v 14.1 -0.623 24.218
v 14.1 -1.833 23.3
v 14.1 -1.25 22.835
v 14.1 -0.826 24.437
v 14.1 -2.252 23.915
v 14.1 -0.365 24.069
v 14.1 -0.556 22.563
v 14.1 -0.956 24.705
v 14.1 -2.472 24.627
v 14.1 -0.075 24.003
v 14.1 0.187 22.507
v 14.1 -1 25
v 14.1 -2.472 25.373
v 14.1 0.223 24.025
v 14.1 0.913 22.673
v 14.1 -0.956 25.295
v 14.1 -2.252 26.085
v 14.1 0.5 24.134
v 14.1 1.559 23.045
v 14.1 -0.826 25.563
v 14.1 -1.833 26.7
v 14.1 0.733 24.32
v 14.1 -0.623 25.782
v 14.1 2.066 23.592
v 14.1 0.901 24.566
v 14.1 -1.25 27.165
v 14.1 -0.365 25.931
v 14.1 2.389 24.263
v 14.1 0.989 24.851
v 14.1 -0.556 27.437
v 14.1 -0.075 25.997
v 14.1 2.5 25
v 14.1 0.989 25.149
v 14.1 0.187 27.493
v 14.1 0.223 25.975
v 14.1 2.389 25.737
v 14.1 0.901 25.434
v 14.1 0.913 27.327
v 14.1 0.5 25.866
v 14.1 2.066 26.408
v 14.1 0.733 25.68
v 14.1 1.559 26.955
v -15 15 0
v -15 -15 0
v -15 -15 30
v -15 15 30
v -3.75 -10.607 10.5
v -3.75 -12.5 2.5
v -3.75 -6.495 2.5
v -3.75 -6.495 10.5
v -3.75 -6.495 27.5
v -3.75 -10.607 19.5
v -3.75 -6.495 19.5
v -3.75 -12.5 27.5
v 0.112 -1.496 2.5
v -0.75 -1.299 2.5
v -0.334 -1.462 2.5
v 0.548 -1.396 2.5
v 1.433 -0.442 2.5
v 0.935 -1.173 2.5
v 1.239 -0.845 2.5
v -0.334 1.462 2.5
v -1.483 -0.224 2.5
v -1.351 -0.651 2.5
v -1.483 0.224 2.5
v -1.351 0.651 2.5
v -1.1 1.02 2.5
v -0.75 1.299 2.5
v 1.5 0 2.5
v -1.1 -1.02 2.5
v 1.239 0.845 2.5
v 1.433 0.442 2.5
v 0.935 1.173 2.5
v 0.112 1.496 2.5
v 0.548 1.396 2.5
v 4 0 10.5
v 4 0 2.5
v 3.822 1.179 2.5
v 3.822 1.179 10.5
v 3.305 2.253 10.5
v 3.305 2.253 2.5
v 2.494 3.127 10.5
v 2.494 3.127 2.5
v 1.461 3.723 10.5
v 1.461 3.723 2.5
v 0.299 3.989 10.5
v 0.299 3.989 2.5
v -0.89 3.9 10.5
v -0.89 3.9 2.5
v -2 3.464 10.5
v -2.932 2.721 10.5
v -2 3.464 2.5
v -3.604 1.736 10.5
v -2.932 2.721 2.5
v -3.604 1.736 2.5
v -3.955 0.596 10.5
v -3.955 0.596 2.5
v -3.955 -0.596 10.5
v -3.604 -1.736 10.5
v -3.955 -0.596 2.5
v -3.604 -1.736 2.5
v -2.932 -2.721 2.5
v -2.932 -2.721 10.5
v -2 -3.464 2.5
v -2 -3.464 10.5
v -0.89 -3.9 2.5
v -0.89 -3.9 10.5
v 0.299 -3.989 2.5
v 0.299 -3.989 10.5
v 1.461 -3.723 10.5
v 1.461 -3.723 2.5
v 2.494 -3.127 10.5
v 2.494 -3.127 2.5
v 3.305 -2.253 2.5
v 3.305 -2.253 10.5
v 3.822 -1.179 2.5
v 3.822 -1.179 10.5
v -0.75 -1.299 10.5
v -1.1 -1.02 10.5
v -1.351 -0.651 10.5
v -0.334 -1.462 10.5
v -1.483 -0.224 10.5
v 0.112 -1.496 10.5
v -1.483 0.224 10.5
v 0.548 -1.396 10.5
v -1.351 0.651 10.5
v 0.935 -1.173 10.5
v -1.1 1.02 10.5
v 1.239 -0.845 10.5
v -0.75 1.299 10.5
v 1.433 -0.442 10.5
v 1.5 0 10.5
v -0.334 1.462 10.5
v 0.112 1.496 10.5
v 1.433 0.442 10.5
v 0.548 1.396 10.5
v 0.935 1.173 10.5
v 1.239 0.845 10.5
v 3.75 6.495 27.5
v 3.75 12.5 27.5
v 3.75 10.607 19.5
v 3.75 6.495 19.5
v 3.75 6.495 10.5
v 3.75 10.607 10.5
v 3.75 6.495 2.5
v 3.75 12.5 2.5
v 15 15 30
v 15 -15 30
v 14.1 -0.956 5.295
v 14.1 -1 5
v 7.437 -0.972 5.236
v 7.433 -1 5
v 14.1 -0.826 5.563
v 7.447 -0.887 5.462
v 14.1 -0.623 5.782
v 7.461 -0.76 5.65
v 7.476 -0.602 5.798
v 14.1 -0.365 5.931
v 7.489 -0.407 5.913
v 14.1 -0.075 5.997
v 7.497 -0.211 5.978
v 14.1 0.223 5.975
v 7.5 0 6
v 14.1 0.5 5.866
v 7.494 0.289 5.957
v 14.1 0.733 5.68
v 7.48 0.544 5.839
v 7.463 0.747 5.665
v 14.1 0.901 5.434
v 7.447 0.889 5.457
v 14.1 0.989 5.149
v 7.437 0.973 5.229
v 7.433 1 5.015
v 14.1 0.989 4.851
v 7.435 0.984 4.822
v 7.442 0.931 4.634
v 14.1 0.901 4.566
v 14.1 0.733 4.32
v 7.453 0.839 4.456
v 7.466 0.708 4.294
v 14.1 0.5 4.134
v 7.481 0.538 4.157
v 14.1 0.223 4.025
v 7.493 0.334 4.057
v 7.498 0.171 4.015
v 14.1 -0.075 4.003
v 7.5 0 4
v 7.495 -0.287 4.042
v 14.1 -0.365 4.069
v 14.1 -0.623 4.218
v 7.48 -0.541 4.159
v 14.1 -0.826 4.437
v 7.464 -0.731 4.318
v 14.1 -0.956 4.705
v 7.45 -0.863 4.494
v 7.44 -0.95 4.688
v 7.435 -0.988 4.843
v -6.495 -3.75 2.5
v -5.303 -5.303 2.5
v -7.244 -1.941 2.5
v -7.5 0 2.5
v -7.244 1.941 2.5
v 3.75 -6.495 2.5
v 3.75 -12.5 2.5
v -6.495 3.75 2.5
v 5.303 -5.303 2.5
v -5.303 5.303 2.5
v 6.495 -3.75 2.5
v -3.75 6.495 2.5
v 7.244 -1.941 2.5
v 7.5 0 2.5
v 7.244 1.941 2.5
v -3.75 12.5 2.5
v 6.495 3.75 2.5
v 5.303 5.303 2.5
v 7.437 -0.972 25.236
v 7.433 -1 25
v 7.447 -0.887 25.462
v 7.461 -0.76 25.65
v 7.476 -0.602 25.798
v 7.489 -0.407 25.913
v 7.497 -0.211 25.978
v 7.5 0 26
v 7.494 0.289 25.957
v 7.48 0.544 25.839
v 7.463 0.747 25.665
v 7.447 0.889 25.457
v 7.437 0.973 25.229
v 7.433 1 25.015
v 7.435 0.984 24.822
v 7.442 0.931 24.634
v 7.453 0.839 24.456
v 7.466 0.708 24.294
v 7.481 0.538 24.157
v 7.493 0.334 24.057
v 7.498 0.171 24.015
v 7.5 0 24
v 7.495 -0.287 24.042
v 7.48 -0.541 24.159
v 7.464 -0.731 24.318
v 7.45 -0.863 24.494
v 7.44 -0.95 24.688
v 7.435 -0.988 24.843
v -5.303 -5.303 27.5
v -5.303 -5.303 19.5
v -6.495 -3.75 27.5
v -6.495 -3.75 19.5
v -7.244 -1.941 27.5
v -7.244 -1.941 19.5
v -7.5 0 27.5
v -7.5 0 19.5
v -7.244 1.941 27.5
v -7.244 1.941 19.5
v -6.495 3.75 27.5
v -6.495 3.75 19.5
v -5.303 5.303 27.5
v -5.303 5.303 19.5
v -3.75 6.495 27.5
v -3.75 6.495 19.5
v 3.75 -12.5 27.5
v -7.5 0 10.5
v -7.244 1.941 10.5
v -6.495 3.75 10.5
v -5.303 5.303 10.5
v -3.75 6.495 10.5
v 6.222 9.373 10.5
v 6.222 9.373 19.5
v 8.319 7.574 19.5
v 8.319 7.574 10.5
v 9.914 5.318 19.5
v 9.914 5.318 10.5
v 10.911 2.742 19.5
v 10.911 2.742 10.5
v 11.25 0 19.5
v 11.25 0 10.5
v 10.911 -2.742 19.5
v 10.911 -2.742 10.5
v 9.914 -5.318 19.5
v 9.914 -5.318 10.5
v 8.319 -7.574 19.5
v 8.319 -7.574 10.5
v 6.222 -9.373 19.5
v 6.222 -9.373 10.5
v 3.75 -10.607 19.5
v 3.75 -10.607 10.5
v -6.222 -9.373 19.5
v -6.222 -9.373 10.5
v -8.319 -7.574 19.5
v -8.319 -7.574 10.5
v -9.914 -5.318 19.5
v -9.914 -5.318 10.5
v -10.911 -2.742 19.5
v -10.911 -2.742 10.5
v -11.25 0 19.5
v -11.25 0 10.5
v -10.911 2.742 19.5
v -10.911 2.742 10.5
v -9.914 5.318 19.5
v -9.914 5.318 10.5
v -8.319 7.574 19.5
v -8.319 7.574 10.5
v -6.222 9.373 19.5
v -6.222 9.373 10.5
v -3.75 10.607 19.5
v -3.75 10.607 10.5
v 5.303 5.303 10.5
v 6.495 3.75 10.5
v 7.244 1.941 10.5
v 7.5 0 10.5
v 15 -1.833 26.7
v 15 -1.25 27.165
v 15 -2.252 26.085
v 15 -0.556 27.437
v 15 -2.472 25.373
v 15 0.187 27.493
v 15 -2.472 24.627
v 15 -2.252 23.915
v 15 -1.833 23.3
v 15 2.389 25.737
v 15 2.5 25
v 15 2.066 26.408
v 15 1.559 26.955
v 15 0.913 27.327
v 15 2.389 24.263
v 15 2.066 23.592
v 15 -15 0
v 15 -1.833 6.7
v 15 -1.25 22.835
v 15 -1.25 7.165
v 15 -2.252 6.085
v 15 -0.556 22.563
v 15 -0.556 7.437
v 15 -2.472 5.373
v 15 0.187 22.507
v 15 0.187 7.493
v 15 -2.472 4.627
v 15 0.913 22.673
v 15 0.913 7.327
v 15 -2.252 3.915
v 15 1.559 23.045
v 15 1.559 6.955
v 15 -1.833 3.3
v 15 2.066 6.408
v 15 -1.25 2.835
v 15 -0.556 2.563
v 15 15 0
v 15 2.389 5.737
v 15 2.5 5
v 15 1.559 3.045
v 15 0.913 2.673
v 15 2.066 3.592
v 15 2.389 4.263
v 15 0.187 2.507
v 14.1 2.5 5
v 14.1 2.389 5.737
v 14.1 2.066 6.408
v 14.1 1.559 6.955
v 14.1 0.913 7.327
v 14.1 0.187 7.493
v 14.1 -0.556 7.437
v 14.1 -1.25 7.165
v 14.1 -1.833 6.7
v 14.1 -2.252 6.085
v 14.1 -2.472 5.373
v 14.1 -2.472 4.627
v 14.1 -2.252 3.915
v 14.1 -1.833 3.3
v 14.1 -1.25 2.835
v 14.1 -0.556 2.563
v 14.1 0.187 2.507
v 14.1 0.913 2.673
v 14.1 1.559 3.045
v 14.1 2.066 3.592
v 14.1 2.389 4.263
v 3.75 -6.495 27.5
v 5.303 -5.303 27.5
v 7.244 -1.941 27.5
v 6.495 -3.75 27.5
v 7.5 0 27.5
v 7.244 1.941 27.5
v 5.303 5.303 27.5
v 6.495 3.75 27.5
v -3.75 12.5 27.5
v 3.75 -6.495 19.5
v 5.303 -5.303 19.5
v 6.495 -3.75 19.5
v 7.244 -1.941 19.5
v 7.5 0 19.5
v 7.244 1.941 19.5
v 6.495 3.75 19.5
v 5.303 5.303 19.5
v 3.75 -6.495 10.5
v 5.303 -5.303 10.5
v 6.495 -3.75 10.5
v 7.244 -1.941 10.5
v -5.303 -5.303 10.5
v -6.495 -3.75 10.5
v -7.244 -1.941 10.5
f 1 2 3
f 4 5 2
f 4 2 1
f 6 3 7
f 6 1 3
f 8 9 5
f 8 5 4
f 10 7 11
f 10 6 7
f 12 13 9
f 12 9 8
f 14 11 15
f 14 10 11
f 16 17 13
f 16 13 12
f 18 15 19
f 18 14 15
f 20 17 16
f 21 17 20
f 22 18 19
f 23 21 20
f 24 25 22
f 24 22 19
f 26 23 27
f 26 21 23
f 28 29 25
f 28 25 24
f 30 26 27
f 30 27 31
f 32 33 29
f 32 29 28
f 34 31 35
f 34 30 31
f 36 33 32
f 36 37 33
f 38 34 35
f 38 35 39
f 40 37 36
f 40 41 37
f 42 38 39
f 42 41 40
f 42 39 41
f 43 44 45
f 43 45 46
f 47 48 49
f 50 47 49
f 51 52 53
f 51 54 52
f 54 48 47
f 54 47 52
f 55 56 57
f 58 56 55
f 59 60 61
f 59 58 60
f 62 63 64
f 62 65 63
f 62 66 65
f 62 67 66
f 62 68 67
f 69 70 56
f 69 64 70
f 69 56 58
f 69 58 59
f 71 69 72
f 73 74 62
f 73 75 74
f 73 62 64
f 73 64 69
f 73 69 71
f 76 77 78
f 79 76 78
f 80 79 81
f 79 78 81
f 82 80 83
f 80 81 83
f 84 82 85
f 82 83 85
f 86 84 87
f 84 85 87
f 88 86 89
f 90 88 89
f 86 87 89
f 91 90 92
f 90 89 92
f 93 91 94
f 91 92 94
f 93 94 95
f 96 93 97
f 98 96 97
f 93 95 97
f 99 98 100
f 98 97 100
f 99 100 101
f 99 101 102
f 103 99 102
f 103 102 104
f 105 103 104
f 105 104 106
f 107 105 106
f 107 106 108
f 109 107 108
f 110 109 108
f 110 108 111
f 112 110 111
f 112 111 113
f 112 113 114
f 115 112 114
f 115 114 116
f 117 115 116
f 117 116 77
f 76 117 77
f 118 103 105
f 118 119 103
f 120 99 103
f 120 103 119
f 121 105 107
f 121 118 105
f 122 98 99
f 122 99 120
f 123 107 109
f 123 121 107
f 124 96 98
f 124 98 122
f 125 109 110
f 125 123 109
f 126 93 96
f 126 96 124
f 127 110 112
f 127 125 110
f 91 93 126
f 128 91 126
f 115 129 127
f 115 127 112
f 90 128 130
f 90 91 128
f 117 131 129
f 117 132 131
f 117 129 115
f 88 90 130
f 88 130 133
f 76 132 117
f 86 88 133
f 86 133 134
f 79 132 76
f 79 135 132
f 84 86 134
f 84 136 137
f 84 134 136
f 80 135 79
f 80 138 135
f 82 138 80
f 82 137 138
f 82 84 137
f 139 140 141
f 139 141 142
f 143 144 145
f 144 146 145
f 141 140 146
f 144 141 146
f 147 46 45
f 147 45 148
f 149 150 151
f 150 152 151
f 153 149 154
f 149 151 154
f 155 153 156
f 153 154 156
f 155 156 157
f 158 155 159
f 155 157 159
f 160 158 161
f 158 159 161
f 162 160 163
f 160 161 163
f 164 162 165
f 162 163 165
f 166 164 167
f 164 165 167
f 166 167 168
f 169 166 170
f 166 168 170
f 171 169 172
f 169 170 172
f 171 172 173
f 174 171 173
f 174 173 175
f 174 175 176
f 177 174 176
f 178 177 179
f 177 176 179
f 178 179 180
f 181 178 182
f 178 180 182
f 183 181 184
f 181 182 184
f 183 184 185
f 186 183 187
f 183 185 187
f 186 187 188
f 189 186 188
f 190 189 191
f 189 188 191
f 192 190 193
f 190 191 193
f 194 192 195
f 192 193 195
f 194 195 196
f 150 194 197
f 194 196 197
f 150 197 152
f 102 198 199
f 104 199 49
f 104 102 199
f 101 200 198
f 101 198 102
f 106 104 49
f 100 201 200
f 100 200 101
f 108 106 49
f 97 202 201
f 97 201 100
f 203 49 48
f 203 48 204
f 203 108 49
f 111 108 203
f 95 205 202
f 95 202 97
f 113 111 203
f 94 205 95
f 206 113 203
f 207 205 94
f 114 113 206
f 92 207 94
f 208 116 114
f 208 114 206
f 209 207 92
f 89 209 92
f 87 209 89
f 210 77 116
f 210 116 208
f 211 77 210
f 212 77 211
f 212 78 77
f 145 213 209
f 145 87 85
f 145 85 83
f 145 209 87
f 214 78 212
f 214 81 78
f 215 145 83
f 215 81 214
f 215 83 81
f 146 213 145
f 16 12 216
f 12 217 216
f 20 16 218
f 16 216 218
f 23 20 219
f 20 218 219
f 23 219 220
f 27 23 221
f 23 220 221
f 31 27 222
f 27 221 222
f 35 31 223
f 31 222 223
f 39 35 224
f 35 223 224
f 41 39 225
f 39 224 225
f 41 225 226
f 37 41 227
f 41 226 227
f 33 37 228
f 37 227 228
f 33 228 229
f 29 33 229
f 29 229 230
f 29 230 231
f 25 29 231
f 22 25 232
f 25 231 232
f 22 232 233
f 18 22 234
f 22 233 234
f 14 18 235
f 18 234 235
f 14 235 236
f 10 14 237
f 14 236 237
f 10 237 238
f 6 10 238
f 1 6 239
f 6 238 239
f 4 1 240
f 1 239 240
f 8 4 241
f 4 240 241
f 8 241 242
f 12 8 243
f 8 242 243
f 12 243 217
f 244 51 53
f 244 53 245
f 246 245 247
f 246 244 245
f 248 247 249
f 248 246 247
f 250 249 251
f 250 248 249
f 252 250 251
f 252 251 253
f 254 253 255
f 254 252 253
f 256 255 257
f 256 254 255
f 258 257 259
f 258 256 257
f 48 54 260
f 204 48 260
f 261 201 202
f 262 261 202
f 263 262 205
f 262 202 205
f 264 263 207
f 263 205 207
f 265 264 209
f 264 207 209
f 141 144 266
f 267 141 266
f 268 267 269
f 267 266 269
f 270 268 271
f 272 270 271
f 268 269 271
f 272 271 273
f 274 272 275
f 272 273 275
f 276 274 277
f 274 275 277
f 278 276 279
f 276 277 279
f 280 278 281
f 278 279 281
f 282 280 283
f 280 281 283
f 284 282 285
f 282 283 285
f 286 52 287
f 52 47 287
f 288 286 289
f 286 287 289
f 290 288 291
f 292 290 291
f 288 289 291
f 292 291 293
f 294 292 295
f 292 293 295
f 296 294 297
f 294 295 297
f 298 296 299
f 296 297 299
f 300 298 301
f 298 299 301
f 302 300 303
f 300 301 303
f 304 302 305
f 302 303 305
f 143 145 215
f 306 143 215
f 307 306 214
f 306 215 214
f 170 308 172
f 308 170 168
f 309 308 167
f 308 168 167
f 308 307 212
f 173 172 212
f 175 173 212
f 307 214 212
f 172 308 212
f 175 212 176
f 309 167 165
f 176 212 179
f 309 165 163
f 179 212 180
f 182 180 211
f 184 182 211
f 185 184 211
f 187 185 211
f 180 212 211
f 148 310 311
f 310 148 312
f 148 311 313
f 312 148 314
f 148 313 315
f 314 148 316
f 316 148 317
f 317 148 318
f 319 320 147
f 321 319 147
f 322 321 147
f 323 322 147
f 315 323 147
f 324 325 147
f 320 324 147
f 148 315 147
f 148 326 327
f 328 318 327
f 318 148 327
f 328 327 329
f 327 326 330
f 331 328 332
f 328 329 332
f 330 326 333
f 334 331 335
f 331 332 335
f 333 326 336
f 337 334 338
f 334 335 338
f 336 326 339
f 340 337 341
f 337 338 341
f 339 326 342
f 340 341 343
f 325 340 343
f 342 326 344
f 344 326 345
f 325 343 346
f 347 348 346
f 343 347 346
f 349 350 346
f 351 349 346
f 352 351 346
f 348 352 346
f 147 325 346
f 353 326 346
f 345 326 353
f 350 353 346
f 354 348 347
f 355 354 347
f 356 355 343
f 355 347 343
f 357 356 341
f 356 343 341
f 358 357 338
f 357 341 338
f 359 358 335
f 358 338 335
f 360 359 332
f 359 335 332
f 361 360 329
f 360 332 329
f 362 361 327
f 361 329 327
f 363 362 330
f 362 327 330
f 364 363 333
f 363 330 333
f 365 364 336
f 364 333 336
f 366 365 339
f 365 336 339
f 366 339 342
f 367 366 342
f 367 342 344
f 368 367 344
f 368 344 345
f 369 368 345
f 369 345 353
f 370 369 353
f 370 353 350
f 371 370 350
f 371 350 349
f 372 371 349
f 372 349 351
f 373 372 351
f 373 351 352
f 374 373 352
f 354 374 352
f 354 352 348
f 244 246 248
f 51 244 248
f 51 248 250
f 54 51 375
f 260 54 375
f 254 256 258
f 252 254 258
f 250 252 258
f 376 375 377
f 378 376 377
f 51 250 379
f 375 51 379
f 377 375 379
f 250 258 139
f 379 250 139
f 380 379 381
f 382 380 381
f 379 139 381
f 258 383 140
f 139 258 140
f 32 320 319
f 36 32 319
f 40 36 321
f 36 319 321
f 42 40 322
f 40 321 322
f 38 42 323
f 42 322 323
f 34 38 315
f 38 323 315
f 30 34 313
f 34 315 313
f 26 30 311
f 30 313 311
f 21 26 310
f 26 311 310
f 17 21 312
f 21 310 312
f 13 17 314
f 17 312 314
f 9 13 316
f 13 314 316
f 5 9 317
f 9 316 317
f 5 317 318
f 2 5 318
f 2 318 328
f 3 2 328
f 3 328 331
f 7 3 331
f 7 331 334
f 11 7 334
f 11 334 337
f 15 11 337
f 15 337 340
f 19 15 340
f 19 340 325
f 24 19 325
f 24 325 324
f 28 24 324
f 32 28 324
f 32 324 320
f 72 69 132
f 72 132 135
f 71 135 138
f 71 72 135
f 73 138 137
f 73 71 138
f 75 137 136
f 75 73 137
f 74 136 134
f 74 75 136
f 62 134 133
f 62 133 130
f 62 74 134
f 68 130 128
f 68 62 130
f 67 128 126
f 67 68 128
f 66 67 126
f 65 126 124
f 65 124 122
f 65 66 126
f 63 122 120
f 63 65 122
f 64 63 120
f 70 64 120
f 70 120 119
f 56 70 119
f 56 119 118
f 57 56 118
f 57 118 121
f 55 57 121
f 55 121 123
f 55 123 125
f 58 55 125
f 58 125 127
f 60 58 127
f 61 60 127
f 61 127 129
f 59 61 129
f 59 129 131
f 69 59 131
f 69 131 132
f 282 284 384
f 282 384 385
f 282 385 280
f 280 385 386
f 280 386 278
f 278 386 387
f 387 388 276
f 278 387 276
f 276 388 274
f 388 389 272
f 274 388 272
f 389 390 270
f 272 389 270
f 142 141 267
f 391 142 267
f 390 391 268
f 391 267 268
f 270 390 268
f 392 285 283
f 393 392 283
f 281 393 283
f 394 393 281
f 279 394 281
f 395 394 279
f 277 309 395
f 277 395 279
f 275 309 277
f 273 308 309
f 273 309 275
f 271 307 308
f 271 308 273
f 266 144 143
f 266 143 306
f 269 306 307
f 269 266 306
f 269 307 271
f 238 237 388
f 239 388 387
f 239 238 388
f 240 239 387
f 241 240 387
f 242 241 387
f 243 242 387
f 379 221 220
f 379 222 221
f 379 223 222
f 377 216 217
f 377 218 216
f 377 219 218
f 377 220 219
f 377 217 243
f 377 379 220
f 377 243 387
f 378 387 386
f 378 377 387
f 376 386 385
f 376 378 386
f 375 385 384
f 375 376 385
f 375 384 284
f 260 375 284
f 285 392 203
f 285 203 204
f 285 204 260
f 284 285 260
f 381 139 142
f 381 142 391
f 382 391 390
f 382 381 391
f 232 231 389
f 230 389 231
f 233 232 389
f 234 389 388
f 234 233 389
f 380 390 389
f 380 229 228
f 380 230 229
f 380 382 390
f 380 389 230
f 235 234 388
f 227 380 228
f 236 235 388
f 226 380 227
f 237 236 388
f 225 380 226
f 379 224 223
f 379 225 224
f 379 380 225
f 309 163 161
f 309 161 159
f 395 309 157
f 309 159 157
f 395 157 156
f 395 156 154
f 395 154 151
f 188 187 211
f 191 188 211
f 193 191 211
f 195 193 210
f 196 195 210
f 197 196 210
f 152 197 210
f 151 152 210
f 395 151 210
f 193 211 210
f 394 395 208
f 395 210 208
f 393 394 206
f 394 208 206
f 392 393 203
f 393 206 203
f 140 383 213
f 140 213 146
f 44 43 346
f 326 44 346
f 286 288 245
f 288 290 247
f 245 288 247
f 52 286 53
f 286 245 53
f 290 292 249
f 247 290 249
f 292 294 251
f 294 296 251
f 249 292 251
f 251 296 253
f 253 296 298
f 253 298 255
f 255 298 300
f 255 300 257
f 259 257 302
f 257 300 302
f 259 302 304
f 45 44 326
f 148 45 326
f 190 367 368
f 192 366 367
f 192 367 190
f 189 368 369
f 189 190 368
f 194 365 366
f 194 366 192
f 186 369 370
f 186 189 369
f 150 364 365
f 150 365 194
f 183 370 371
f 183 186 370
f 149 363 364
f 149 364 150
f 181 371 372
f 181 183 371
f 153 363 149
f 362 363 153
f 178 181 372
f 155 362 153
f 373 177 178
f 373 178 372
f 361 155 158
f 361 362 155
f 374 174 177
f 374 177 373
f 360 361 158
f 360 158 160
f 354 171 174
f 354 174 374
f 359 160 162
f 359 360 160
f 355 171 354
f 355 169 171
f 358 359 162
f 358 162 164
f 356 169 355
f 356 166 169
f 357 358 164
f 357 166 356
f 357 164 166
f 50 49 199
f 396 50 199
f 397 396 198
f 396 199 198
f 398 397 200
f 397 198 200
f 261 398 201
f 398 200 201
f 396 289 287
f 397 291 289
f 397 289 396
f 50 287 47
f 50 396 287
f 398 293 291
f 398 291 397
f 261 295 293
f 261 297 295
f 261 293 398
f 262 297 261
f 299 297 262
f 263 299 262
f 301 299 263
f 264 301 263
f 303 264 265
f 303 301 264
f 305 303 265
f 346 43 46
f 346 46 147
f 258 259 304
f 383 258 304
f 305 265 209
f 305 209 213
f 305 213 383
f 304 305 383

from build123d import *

# Parameters (mm, degrees)
F0_W            = 30
F0_H            = 30
F1_DEPTH        = 30
F2_T            = -2.5
F6_DEPTH        = 10.5
F9_DEPTH        = 10.5
F11_DEPTH       = 4.5
F12_DEPTH       = 4.5
F14_D           = 2
F14_DEPTH       = 15
F14_CBORE_D     = 5
F14_CBORE_DEPTH = 0.9
F14_TIP         = 0.600860619
F15_R           = 4
F15_R_2         = 1.5
F16_DEPTH       = 10.5


with BuildPart() as f1:
    # F0 (on Top) → F1 (new body)
    with BuildSketch(Plane.XY):
        Rectangle(F0_W, F0_H)
    extrude(amount=F1_DEPTH)

    # F2 (hollow: no face is removed)
    offset(amount=F2_T, mode=Mode.SUBTRACT)

    # F3 (on Top) → F6 (join, through all)
    with BuildSketch(Plane.XY):
        with BuildLine():
            ThreePointArc((3.75, 6.4951905284), (6.4951905284, 3.75), (7.5, 0))
            ThreePointArc((7.5, 0), (6.4951905284, -3.75), (3.75, -6.4951905284))
            Line((3.75, -6.4951905284), (3.75, -12.5))
            Line((3.75, -12.5), (12.5, -12.5))
            Line((12.5, -12.5), (12.5, 12.5))
            Line((12.5, 12.5), (3.75, 12.5))
            Line((3.75, 12.5), (3.75, 6.4951905284))
        make_face()
        with BuildLine():
            Line((-3.75, 6.4951905284), (-3.75, 12.5))
            Line((-3.75, 12.5), (-12.5, 12.5))
            Line((-12.5, 12.5), (-12.5, -12.5))
            Line((-12.5, -12.5), (-3.75, -12.5))
            Line((-3.75, -12.5), (-3.75, -6.4951905284))
            ThreePointArc((-3.75, -6.4951905284), (-6.4951905284, -3.75), (-7.5, 0))
            ThreePointArc((-7.5, 0), (-6.4951905284, 3.75), (-3.75, 6.4951905284))
        make_face()
    extrude(amount=F6_DEPTH)

    # F7 (on face) → F9 (join, through all)
    with BuildSketch(Plane.XY.offset(30)):
        with BuildLine():
            ThreePointArc((3.75, 6.4951905284), (6.4951905284, 3.75), (7.5, 0))
            ThreePointArc((7.5, 0), (6.4951905284, -3.75), (3.75, -6.4951905284))
            Line((3.75, -6.4951905284), (3.75, -12.5))
            Line((3.75, -12.5), (12.5, -12.5))
            Line((12.5, -12.5), (12.5, 12.5))
            Line((12.5, 12.5), (3.75, 12.5))
            Line((3.75, 12.5), (3.75, 6.4951905284))
        make_face()
        with BuildLine():
            Line((-3.75, 6.4951905284), (-3.75, 12.5))
            Line((-3.75, 12.5), (-12.5, 12.5))
            Line((-12.5, 12.5), (-12.5, -12.5))
            Line((-12.5, -12.5), (-3.75, -12.5))
            Line((-3.75, -12.5), (-3.75, -6.4951905284))
            ThreePointArc((-3.75, -6.4951905284), (-6.4951905284, -3.75), (-7.5, 0))
            ThreePointArc((-7.5, 0), (-6.4951905284, 3.75), (-3.75, 6.4951905284))
        make_face()
    extrude(amount=-F9_DEPTH)

    # F10 (on mid) → F11 (join, through all)
    with BuildSketch(Plane.XY.offset(15)):
        with BuildLine():
            Line((3.75, -10.6066017178), (3.75, -12.5))
            Line((3.75, -12.5), (12.5, -12.5))
            Line((12.5, -12.5), (12.5, 12.5))
            Line((12.5, 12.5), (3.75, 12.5))
            Line((3.75, 12.5), (3.75, 10.6066017178))
            ThreePointArc((3.75, 10.6066017178), (11.25, 0), (3.75, -10.6066017178))
        make_face()
        with BuildLine():
            Line((-3.75, 10.6066017178), (-3.75, 12.5))
            Line((-3.75, 12.5), (-12.5, 12.5))
            Line((-12.5, 12.5), (-12.5, -12.5))
            Line((-12.5, -12.5), (-3.75, -12.5))
            Line((-3.75, -12.5), (-3.75, -10.6066017178))
            ThreePointArc((-3.75, -10.6066017178), (-11.25, 0), (-3.75, 10.6066017178))
        make_face()
    extrude(amount=-F11_DEPTH)

    # F10 (on mid) → F12 (join, through all)
    with BuildSketch(Plane.XY.offset(15)):
        with BuildLine():
            Line((3.75, -10.6066017178), (3.75, -12.5))
            Line((3.75, -12.5), (12.5, -12.5))
            Line((12.5, -12.5), (12.5, 12.5))
            Line((12.5, 12.5), (3.75, 12.5))
            Line((3.75, 12.5), (3.75, 10.6066017178))
            ThreePointArc((3.75, 10.6066017178), (11.25, 0), (3.75, -10.6066017178))
        make_face()
        with BuildLine():
            Line((-3.75, 10.6066017178), (-3.75, 12.5))
            Line((-3.75, 12.5), (-12.5, 12.5))
            Line((-12.5, 12.5), (-12.5, -12.5))
            Line((-12.5, -12.5), (-3.75, -12.5))
            Line((-3.75, -12.5), (-3.75, -10.6066017178))
            ThreePointArc((-3.75, -10.6066017178), (-11.25, 0), (-3.75, 10.6066017178))
        make_face()
    extrude(amount=F12_DEPTH)

    # F14
    with Locations(Plane.YZ.offset(15)):
        with Locations((0, 5), (0, 25)):
            CounterBoreHole(F14_D / 2, F14_CBORE_D / 2, F14_CBORE_DEPTH, depth=F14_DEPTH)
            with Locations((0, 0, -(F14_DEPTH + F14_TIP / 2))):  # 118° drill point
                Cone(0, F14_D / 2, F14_TIP, mode=Mode.SUBTRACT)

    # F15 (on Top) → F16 (join, through all)
    with BuildSketch(Plane.XY):
        Circle(F15_R)
        Circle(F15_R_2, mode=Mode.SUBTRACT)
    extrude(amount=F16_DEPTH)


solid = f1.part
